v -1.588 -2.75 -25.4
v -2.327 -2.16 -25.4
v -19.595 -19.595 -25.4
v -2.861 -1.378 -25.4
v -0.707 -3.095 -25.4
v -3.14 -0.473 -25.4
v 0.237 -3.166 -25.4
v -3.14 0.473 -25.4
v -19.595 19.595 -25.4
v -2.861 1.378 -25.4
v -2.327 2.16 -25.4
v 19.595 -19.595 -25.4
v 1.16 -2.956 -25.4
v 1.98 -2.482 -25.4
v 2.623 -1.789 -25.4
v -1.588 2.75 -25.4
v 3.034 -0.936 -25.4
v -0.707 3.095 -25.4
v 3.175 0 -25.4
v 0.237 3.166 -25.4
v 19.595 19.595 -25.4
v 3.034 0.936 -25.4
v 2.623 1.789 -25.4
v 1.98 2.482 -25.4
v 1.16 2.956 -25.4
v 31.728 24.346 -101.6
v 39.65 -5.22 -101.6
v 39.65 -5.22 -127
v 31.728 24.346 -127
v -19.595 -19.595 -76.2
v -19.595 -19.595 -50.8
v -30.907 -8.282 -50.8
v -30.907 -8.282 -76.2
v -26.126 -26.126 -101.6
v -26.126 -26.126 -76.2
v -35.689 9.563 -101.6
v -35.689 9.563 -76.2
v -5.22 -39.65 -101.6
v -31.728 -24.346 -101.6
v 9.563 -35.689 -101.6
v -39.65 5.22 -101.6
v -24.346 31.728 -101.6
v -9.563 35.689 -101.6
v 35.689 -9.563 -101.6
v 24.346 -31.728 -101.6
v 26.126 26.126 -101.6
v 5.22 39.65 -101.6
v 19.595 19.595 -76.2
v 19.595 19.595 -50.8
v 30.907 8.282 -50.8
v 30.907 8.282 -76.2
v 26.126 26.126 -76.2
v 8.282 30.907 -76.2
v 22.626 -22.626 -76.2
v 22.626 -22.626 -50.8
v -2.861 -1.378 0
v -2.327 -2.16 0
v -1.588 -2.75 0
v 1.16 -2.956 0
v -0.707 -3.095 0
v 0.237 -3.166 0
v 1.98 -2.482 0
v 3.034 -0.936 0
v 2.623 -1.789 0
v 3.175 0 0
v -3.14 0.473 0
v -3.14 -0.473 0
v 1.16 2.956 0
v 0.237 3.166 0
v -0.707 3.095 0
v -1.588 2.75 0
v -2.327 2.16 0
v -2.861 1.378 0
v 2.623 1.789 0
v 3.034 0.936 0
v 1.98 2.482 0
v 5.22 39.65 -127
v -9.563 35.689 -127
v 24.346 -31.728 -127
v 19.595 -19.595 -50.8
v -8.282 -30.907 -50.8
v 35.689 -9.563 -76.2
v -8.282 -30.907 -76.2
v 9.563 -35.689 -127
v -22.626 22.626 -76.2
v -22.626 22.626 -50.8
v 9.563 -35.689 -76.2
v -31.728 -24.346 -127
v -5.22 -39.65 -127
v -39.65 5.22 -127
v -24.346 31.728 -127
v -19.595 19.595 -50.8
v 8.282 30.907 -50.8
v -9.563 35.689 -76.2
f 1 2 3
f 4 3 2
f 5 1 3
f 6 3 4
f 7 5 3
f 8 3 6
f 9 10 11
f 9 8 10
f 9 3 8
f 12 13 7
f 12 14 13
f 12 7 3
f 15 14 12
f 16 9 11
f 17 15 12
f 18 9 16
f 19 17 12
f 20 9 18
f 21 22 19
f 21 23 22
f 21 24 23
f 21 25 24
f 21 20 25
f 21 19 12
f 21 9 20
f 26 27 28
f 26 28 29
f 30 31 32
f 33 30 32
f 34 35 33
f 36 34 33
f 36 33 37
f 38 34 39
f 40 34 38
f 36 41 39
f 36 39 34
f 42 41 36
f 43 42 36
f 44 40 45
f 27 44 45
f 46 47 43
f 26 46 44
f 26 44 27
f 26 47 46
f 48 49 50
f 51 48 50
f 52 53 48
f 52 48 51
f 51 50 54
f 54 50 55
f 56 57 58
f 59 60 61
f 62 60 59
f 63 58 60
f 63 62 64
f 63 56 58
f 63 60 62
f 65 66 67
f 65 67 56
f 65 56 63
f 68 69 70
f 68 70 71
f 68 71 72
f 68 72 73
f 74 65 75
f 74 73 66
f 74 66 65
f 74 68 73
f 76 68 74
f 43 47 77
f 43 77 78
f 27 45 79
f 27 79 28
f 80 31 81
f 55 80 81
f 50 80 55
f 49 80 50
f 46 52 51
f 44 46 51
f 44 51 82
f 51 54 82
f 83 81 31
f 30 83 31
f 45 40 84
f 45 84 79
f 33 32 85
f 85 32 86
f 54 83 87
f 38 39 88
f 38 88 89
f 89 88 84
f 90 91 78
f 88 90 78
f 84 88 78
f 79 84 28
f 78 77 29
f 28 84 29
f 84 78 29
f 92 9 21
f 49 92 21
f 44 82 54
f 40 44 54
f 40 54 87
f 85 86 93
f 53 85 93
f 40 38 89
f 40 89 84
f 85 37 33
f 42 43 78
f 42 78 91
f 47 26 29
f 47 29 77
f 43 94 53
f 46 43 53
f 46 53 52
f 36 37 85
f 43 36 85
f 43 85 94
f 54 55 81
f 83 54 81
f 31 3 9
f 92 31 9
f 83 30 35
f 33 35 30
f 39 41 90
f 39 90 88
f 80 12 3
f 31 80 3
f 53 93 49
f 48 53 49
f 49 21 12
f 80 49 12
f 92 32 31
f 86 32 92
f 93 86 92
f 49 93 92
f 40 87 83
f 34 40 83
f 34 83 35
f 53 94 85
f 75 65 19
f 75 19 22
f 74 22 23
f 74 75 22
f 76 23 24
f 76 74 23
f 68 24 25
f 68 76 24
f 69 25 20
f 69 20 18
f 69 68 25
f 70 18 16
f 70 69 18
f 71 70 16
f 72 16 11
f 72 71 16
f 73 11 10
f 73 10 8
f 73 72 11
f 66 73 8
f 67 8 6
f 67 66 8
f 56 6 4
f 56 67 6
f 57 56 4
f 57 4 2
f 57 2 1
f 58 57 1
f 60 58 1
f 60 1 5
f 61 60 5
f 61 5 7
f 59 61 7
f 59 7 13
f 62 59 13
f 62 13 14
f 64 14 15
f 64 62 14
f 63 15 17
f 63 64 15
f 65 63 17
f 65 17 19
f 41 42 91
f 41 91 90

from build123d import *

# Parameters (mm, degrees)
F0_W     = 39.1890458631
F0_H     = 39.1890458631
F0_R     = 3.175
F1_DEPTH = 127
F2_DEPTH = 101.6
F3_DEPTH = 76.2
F4_DEPTH = 50.8
F5_DEPTH = 25.4


with BuildPart() as f1:
    # F0 (on Top) → F1 (new body)
    with BuildSketch(Plane.XY):
        Polygon((-22.6258061783, 22.6258061783), (8.2816198424, 30.9074260207), (-9.5627908906, 35.688821466), align=None)
        Polygon((-9.5627908906, 35.688821466), (8.2816198424, 30.9074260207), (26.1260305754, 26.1260305754), (30.9074260207, 8.2816198424), (35.688821466, -9.5627908906), (22.6258061783, -22.6258061783), (9.5627908906, -35.688821466), (24.345584767, -31.727783785), (39.6498591471, -5.2200029857), (31.727783785, 24.345584767), (5.2200029857, 39.6498591471), align=None)
        Polygon((-35.688821466, 9.5627908906), (-22.6258061783, 22.6258061783), (-9.5627908906, 35.688821466), (-24.345584767, 31.727783785), (-39.6498591471, 5.2200029857), (-31.727783785, -24.345584767), (-5.2200029857, -39.6498591471), (9.5627908906, -35.688821466), (-8.2816198424, -30.9074260207), (-26.1260305754, -26.1260305754), (-30.9074260207, -8.2816198424), align=None)
        Polygon((9.5627908906, -35.688821466), (22.6258061783, -22.6258061783), (-8.2816198424, -30.9074260207), align=None)
        Polygon((-30.9074260207, -8.2816198424), (-22.6258061783, 22.6258061783), (-35.688821466, 9.5627908906), align=None)
        Polygon((-8.2816198424, -30.9074260207), (-19.5945229316, -19.5945229316), (-30.9074260207, -8.2816198424), (-26.1260305754, -26.1260305754), align=None)
        Polygon((30.9074260207, 8.2816198424), (19.5945229316, 19.5945229316), (19.5945229316, -19.5945229316), (-19.5945229316, -19.5945229316), (-8.2816198424, -30.9074260207), (22.6258061783, -22.6258061783), align=None)
        Polygon((35.688821466, -9.5627908906), (30.9074260207, 8.2816198424), (22.6258061783, -22.6258061783), align=None)
        Polygon((8.2816198424, 30.9074260207), (19.5945229316, 19.5945229316), (30.9074260207, 8.2816198424), (26.1260305754, 26.1260305754), align=None)
        Polygon((-19.5945229316, 19.5945229316), (19.5945229316, 19.5945229316), (8.2816198424, 30.9074260207), (-22.6258061783, 22.6258061783), (-30.9074260207, -8.2816198424), (-19.5945229316, -19.5945229316), align=None)
        Rectangle(F0_W, F0_H)
        Circle(F0_R, mode=Mode.SUBTRACT)
        Circle(F0_R)
    extrude(amount=-F1_DEPTH)

    # F0 (on Top) → F2 (cut)
    with BuildSketch(Plane.XY):
        Polygon((-35.688821466, 9.5627908906), (-22.6258061783, 22.6258061783), (-9.5627908906, 35.688821466), (-24.345584767, 31.727783785), (-39.6498591471, 5.2200029857), (-31.727783785, -24.345584767), (-5.2200029857, -39.6498591471), (9.5627908906, -35.688821466), (-8.2816198424, -30.9074260207), (-26.1260305754, -26.1260305754), (-30.9074260207, -8.2816198424), align=None)
        Polygon((-9.5627908906, 35.688821466), (8.2816198424, 30.9074260207), (26.1260305754, 26.1260305754), (30.9074260207, 8.2816198424), (35.688821466, -9.5627908906), (22.6258061783, -22.6258061783), (9.5627908906, -35.688821466), (24.345584767, -31.727783785), (39.6498591471, -5.2200029857), (31.727783785, 24.345584767), (5.2200029857, 39.6498591471), align=None)
    extrude(amount=-F2_DEPTH, mode=Mode.SUBTRACT)

    # F0 (on Top) → F3 (cut)
    with BuildSketch(Plane.XY):
        Polygon((-8.2816198424, -30.9074260207), (-19.5945229316, -19.5945229316), (-30.9074260207, -8.2816198424), (-26.1260305754, -26.1260305754), align=None)
        Polygon((9.5627908906, -35.688821466), (22.6258061783, -22.6258061783), (-8.2816198424, -30.9074260207), align=None)
        Polygon((35.688821466, -9.5627908906), (30.9074260207, 8.2816198424), (22.6258061783, -22.6258061783), align=None)
        Polygon((8.2816198424, 30.9074260207), (19.5945229316, 19.5945229316), (30.9074260207, 8.2816198424), (26.1260305754, 26.1260305754), align=None)
        Polygon((-22.6258061783, 22.6258061783), (8.2816198424, 30.9074260207), (-9.5627908906, 35.688821466), align=None)
        Polygon((-30.9074260207, -8.2816198424), (-22.6258061783, 22.6258061783), (-35.688821466, 9.5627908906), align=None)
    extrude(amount=-F3_DEPTH, mode=Mode.SUBTRACT)

    # F0 (on Top) → F4 (cut)
    with BuildSketch(Plane.XY):
        Polygon((-19.5945229316, 19.5945229316), (19.5945229316, 19.5945229316), (8.2816198424, 30.9074260207), (-22.6258061783, 22.6258061783), (-30.9074260207, -8.2816198424), (-19.5945229316, -19.5945229316), align=None)
        Polygon((30.9074260207, 8.2816198424), (19.5945229316, 19.5945229316), (19.5945229316, -19.5945229316), (-19.5945229316, -19.5945229316), (-8.2816198424, -30.9074260207), (22.6258061783, -22.6258061783), align=None)
    extrude(amount=-F4_DEPTH, mode=Mode.SUBTRACT)

    # F0 (on Top) → F5 (cut)
    with BuildSketch(Plane.XY):
        Rectangle(F0_W, F0_H)
        Circle(F0_R, mode=Mode.SUBTRACT)
    extrude(amount=-F5_DEPTH, mode=Mode.SUBTRACT)


solid = f1.part
